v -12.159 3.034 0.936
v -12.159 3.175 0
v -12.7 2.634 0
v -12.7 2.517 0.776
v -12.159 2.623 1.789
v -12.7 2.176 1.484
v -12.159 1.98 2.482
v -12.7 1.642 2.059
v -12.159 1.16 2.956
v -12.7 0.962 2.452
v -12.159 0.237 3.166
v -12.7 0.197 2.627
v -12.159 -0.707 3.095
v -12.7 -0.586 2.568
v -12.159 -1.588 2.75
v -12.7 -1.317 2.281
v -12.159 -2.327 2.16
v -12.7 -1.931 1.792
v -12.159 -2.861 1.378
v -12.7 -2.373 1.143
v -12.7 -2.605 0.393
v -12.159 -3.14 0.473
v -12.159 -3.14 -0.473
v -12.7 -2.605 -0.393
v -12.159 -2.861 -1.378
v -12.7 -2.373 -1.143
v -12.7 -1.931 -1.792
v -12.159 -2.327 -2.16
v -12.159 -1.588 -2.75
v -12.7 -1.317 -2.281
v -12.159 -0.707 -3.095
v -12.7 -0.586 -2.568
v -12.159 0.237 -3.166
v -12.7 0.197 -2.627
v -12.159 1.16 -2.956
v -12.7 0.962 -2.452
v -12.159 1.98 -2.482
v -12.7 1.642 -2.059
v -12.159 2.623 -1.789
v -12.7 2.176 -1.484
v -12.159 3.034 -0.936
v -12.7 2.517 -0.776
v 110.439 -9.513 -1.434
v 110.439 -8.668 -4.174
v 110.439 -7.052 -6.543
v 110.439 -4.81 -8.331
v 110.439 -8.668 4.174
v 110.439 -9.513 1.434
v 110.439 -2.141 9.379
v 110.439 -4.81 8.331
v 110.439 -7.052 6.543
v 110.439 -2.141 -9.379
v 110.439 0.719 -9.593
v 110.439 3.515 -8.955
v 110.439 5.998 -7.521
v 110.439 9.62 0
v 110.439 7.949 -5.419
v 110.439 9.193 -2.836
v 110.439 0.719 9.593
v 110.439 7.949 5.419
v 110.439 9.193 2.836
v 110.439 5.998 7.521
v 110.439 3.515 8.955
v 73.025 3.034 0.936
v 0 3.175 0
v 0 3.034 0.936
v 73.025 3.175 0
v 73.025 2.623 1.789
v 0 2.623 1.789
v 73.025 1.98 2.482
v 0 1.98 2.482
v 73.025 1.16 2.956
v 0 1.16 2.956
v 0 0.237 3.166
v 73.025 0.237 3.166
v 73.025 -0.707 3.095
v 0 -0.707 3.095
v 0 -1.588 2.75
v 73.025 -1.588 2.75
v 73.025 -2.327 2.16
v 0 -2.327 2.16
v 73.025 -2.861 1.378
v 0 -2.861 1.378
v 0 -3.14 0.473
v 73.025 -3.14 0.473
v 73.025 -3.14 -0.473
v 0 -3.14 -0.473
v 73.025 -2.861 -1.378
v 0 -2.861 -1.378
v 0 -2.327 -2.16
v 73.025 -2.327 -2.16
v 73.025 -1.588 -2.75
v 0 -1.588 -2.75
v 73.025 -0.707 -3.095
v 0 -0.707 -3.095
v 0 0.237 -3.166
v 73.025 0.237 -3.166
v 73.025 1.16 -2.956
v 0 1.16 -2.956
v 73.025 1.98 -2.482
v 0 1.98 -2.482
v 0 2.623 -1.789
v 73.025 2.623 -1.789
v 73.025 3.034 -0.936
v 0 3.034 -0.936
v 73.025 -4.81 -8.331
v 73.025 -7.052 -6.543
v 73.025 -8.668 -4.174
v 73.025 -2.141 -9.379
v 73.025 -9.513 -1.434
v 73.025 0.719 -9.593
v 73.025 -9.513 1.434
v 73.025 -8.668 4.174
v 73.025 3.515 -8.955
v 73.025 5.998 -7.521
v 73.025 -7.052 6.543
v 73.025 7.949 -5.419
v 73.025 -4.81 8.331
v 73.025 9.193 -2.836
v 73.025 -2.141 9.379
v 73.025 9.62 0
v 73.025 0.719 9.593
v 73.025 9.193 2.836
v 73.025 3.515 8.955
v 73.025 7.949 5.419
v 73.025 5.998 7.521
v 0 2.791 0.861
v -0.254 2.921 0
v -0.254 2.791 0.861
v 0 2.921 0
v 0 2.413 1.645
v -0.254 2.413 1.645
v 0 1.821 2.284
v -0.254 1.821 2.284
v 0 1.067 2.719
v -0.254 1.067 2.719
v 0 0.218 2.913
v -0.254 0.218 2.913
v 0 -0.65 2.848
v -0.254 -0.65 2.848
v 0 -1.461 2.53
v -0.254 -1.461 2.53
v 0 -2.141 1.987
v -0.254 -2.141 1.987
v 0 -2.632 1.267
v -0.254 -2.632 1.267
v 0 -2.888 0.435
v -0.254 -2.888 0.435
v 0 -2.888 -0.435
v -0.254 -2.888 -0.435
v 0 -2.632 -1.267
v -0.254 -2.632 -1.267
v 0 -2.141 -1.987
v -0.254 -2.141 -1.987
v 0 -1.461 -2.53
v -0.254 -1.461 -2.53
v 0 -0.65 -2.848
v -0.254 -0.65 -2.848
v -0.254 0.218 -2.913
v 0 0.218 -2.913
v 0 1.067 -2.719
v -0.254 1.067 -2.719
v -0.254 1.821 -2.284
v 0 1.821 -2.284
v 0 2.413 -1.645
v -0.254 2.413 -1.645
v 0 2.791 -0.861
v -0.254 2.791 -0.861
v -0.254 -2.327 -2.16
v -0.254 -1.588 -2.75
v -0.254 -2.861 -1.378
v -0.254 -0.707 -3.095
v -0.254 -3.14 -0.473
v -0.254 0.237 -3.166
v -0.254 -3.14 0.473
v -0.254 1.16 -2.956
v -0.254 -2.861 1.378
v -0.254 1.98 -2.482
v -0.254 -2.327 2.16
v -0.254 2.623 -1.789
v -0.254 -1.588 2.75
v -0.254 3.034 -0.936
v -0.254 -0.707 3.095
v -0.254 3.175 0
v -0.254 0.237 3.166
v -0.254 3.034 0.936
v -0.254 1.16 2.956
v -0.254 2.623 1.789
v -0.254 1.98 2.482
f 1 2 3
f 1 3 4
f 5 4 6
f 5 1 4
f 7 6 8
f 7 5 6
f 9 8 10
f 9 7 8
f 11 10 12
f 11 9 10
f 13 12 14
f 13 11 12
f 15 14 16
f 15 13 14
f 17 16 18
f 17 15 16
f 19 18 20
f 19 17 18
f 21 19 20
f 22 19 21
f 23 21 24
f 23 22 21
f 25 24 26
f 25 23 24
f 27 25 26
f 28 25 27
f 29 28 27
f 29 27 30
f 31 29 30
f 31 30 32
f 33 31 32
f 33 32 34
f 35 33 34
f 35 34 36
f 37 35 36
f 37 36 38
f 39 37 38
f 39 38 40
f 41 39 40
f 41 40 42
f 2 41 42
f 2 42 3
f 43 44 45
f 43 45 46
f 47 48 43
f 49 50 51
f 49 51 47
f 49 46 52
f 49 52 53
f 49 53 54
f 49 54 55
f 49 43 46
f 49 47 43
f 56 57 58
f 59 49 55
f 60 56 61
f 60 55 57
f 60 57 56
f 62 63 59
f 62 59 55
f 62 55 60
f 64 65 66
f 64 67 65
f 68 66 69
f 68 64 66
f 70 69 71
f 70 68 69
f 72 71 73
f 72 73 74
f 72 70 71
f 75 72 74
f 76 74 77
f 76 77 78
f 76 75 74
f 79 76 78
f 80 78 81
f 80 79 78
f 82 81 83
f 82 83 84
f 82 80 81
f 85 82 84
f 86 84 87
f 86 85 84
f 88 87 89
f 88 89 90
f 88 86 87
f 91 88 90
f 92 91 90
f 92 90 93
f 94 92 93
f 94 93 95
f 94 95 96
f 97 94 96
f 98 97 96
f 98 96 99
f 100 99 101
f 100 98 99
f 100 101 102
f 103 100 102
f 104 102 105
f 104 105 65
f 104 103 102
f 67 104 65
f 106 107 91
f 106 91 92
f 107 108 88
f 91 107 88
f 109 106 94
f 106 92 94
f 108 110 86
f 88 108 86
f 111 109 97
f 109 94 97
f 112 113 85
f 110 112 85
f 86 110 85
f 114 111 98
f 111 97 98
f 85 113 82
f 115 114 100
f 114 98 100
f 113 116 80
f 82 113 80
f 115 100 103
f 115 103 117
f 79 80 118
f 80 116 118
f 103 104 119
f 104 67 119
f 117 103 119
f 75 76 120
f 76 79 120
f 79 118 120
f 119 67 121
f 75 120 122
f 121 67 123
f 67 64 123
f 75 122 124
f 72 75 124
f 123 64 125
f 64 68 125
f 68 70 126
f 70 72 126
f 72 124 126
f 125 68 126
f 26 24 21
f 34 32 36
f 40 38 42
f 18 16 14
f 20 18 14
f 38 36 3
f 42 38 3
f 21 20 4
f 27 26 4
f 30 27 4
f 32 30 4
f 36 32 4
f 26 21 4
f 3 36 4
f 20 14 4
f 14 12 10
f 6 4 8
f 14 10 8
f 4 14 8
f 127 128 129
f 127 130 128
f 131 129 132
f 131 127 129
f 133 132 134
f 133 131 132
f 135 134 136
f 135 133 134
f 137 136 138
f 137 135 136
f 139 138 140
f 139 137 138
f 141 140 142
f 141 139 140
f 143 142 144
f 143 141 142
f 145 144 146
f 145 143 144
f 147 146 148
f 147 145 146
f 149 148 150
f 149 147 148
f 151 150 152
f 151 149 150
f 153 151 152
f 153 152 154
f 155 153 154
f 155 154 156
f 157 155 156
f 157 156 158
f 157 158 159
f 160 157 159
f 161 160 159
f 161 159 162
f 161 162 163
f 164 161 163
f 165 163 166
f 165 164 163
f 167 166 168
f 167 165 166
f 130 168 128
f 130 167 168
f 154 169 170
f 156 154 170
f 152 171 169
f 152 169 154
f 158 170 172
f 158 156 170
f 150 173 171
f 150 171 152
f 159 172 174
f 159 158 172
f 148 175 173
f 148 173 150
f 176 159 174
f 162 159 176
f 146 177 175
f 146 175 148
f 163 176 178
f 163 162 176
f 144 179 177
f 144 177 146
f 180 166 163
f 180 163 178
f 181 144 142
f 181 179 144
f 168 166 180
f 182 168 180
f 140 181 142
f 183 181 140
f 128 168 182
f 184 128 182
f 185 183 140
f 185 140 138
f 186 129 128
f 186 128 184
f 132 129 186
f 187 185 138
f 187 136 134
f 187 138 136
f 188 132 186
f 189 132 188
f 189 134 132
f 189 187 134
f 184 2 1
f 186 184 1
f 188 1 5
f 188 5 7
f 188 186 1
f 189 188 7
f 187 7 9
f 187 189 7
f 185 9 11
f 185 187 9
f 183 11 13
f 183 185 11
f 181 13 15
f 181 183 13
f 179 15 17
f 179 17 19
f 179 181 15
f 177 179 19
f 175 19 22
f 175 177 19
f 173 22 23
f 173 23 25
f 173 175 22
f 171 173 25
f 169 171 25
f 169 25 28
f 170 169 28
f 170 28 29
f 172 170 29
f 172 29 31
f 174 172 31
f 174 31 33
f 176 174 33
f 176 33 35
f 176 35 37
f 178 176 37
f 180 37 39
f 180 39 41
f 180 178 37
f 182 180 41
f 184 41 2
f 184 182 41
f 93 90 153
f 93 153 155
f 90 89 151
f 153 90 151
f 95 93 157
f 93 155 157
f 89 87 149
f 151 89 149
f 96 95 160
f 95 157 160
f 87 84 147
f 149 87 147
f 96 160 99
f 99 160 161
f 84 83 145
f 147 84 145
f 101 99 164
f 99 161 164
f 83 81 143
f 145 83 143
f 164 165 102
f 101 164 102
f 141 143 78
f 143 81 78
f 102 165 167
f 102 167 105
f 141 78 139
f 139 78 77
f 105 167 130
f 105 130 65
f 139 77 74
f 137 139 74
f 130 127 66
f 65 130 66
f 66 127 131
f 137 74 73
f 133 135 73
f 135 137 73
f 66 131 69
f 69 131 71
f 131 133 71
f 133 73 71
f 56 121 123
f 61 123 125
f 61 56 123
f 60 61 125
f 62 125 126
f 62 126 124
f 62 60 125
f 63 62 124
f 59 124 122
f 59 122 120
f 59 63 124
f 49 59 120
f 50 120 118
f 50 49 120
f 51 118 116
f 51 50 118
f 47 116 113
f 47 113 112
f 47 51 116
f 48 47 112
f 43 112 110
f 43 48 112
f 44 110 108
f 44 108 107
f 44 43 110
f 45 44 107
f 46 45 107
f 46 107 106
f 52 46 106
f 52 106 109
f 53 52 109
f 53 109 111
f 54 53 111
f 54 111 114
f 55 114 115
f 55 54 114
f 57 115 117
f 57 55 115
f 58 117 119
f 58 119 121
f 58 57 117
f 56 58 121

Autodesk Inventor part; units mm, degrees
sketch "Sketch_1" plane through (0, 0, 0) normal (0, 0, 1) x (1, 0, 0)
  line L0 (110.4392, 0) -> (0, 0)
  line L1 (0, 0) -> (0, 3.175)
  line L2 (0, 3.175) -> (73.025, 3.175)
  line L3 (73.025, 3.175) -> (73.025, 9.6203)
  line L4 (73.025, 9.6203) -> (110.4392, 9.6203)
  line L5 (110.4392, 9.6203) -> (110.4392, 0)
  line L6 (110.4392, 0) -> (0, 0)
revolve "Revolution1" add sketch "Sketch_1" angle 360 about axis through (110.4392, 0, 0) along (1, 0, 0)
sketch "Sketch_3" plane through (0, 0, 0) normal (0, 0, 1) x (1, 0, 0)
  line L0 (0, 0) -> (-12.7, 0)
  line L1 (-12.7, 0) -> (-12.7, 2.634)
  line L2 (-12.7, 2.634) -> (-12.159, 3.175)
  line L3 (-12.159, 3.175) -> (0, 3.175)
  line L4 (0, 3.175) -> (0, 0)
  line L5 (0, 0) -> (-12.7, 0)
revolve "Revolution2" add sketch "Sketch_3" angle 360 about axis through (0, 0, 0) along (1, 0, 0)
thread "Thread1" size "1/4-28 UNF" class "2A" standard "ANSI Unified Screw Threads" length 12.159
sketch "Sketch_30" plane through (0, 0, 0) normal (0, 0, 1) x (1, 0, 0)
  line L0 (0, 0) -> (-0.254, 0)
  line L1 (-0.254, 2.921) -> (0, 2.921)
  line L2 (0, 2.921) -> (0, 3.429)
  line L3 (0, 3.429) -> (-0.254, 3.429)
  line L4 (-0.254, 3.429) -> (-0.254, 2.921)
revolve "Revolution3" cut sketch "Sketch_30" angle 360 about axis through (0, 0, 0) along (1, 0, 0)
ref_plane "dia1_XY" through (0, 3.175, 0) normal (1, 0, 0) x (0, 0, -1)
ref_plane "dia1_YZ" through (0, 3.175, 0) normal (0, 0, -1) x (0, 1, 0)
ref_plane "dia1_ZX" through (0, 3.175, 0) normal (0, 1, 0) x (1, 0, 0)
ref_plane "dia12_XY" through (0, 0, 10.2235) normal (1, 0, 0) x (0, 0, -1)
ref_plane "dia12_YZ" through (0, 0, 10.2235) normal (0, 0, -1) x (0, 1, 0)
ref_plane "dia12_ZX" through (0, 0, 10.2235) normal (0, 1, 0) x (1, 0, 0)
ref_plane "dia1r_XY" through (0, 0, 10.9537) normal (1, 0, 0) x (0, 0, -1)
ref_plane "dia1r_YZ" through (0, 0, 10.9537) normal (0, 0, -1) x (0, 1, 0)
ref_plane "dia1r_ZX" through (0, 0, 10.9537) normal (0, 1, 0) x (1, 0, 0)
ref_plane "dia2_XY" through (0, -3.175, 0) normal (1, 0, 0) x (0, 0, -1)
ref_plane "dia2_YZ" through (0, -3.175, 0) normal (0, 0, -1) x (0, 1, 0)
ref_plane "dia2_ZX" through (0, -3.175, 0) normal (0, 1, 0) x (1, 0, 0)
ref_plane "dia22_XY" through (0, 0, -10.2235) normal (1, 0, 0) x (0, 0, -1)
ref_plane "dia22_YZ" through (0, 0, -10.2235) normal (0, 0, -1) x (0, 1, 0)
ref_plane "dia22_ZX" through (0, 0, -10.2235) normal (0, 1, 0) x (1, 0, 0)
ref_plane "dia2r_XY" through (0, 0, -10.9537) normal (1, 0, 0) x (0, 0, -1)
ref_plane "dia2r_YZ" through (0, 0, -10.9537) normal (0, 0, -1) x (0, 1, 0)
ref_plane "dia2r_ZX" through (0, 0, -10.9537) normal (0, 1, 0) x (1, 0, 0)
ref_plane "rl1_XY" through (-12.7, 0, 0) normal (1, 0, 0) x (0, 0, -1)
ref_plane "rl1_YZ" through (-12.7, 0, 0) normal (0, 0, -1) x (0, 1, 0)
ref_plane "rl1_ZX" through (-12.7, 0, 0) normal (0, 1, 0) x (1, 0, 0)
ref_plane "rl2_XY" through (0, 0, 0) normal (1, 0, 0) x (0, 0, -1)
ref_plane "rl2_YZ" through (0, 0, 0) normal (0, 0, -1) x (0, 1, 0)
ref_plane "rl2_ZX" through (0, 0, 0) normal (0, 1, 0) x (1, 0, 0)
ref_plane "rod_cp_XY" through (0, 0, 0) normal (1, 0, 0) x (0, 0, -1)
ref_plane "rod_cp_YZ" through (0, 0, 0) normal (0, 0, -1) x (0, 1, 0)
ref_plane "rod_cp_ZX" through (0, 0, 0) normal (0, 1, 0) x (1, 0, 0)
ref_plane "thd1_XY" through (-12.7, 3.175, 0) normal (1, 0, 0) x (0, 0, -1)
ref_plane "thd1_YZ" through (-12.7, 3.175, 0) normal (0, 0, -1) x (0, 1, 0)
ref_plane "thd1_ZX" through (-12.7, 3.175, 0) normal (0, 1, 0) x (1, 0, 0)
ref_plane "thd2_XY" through (-12.7, -3.175, 0) normal (1, 0, 0) x (0, 0, -1)
ref_plane "thd2_YZ" through (-12.7, -3.175, 0) normal (0, 0, -1) x (0, 1, 0)
ref_plane "thd2_ZX" through (-12.7, -3.175, 0) normal (0, 1, 0) x (1, 0, 0)
ref_plane "to_rod_clevis_XY" through (-16.764, 0, 0) normal (1, 0, 0) x (0, 0, -1)
ref_plane "to_rod_clevis_YZ" through (-16.764, 0, 0) normal (0, 0, -1) x (0, 1, 0)
ref_plane "to_rod_clevis_ZX" through (-16.764, 0, 0) normal (0, 1, 0) x (1, 0, 0)
properties part number "C-042-P0_rod" material "Stainless Steel"
